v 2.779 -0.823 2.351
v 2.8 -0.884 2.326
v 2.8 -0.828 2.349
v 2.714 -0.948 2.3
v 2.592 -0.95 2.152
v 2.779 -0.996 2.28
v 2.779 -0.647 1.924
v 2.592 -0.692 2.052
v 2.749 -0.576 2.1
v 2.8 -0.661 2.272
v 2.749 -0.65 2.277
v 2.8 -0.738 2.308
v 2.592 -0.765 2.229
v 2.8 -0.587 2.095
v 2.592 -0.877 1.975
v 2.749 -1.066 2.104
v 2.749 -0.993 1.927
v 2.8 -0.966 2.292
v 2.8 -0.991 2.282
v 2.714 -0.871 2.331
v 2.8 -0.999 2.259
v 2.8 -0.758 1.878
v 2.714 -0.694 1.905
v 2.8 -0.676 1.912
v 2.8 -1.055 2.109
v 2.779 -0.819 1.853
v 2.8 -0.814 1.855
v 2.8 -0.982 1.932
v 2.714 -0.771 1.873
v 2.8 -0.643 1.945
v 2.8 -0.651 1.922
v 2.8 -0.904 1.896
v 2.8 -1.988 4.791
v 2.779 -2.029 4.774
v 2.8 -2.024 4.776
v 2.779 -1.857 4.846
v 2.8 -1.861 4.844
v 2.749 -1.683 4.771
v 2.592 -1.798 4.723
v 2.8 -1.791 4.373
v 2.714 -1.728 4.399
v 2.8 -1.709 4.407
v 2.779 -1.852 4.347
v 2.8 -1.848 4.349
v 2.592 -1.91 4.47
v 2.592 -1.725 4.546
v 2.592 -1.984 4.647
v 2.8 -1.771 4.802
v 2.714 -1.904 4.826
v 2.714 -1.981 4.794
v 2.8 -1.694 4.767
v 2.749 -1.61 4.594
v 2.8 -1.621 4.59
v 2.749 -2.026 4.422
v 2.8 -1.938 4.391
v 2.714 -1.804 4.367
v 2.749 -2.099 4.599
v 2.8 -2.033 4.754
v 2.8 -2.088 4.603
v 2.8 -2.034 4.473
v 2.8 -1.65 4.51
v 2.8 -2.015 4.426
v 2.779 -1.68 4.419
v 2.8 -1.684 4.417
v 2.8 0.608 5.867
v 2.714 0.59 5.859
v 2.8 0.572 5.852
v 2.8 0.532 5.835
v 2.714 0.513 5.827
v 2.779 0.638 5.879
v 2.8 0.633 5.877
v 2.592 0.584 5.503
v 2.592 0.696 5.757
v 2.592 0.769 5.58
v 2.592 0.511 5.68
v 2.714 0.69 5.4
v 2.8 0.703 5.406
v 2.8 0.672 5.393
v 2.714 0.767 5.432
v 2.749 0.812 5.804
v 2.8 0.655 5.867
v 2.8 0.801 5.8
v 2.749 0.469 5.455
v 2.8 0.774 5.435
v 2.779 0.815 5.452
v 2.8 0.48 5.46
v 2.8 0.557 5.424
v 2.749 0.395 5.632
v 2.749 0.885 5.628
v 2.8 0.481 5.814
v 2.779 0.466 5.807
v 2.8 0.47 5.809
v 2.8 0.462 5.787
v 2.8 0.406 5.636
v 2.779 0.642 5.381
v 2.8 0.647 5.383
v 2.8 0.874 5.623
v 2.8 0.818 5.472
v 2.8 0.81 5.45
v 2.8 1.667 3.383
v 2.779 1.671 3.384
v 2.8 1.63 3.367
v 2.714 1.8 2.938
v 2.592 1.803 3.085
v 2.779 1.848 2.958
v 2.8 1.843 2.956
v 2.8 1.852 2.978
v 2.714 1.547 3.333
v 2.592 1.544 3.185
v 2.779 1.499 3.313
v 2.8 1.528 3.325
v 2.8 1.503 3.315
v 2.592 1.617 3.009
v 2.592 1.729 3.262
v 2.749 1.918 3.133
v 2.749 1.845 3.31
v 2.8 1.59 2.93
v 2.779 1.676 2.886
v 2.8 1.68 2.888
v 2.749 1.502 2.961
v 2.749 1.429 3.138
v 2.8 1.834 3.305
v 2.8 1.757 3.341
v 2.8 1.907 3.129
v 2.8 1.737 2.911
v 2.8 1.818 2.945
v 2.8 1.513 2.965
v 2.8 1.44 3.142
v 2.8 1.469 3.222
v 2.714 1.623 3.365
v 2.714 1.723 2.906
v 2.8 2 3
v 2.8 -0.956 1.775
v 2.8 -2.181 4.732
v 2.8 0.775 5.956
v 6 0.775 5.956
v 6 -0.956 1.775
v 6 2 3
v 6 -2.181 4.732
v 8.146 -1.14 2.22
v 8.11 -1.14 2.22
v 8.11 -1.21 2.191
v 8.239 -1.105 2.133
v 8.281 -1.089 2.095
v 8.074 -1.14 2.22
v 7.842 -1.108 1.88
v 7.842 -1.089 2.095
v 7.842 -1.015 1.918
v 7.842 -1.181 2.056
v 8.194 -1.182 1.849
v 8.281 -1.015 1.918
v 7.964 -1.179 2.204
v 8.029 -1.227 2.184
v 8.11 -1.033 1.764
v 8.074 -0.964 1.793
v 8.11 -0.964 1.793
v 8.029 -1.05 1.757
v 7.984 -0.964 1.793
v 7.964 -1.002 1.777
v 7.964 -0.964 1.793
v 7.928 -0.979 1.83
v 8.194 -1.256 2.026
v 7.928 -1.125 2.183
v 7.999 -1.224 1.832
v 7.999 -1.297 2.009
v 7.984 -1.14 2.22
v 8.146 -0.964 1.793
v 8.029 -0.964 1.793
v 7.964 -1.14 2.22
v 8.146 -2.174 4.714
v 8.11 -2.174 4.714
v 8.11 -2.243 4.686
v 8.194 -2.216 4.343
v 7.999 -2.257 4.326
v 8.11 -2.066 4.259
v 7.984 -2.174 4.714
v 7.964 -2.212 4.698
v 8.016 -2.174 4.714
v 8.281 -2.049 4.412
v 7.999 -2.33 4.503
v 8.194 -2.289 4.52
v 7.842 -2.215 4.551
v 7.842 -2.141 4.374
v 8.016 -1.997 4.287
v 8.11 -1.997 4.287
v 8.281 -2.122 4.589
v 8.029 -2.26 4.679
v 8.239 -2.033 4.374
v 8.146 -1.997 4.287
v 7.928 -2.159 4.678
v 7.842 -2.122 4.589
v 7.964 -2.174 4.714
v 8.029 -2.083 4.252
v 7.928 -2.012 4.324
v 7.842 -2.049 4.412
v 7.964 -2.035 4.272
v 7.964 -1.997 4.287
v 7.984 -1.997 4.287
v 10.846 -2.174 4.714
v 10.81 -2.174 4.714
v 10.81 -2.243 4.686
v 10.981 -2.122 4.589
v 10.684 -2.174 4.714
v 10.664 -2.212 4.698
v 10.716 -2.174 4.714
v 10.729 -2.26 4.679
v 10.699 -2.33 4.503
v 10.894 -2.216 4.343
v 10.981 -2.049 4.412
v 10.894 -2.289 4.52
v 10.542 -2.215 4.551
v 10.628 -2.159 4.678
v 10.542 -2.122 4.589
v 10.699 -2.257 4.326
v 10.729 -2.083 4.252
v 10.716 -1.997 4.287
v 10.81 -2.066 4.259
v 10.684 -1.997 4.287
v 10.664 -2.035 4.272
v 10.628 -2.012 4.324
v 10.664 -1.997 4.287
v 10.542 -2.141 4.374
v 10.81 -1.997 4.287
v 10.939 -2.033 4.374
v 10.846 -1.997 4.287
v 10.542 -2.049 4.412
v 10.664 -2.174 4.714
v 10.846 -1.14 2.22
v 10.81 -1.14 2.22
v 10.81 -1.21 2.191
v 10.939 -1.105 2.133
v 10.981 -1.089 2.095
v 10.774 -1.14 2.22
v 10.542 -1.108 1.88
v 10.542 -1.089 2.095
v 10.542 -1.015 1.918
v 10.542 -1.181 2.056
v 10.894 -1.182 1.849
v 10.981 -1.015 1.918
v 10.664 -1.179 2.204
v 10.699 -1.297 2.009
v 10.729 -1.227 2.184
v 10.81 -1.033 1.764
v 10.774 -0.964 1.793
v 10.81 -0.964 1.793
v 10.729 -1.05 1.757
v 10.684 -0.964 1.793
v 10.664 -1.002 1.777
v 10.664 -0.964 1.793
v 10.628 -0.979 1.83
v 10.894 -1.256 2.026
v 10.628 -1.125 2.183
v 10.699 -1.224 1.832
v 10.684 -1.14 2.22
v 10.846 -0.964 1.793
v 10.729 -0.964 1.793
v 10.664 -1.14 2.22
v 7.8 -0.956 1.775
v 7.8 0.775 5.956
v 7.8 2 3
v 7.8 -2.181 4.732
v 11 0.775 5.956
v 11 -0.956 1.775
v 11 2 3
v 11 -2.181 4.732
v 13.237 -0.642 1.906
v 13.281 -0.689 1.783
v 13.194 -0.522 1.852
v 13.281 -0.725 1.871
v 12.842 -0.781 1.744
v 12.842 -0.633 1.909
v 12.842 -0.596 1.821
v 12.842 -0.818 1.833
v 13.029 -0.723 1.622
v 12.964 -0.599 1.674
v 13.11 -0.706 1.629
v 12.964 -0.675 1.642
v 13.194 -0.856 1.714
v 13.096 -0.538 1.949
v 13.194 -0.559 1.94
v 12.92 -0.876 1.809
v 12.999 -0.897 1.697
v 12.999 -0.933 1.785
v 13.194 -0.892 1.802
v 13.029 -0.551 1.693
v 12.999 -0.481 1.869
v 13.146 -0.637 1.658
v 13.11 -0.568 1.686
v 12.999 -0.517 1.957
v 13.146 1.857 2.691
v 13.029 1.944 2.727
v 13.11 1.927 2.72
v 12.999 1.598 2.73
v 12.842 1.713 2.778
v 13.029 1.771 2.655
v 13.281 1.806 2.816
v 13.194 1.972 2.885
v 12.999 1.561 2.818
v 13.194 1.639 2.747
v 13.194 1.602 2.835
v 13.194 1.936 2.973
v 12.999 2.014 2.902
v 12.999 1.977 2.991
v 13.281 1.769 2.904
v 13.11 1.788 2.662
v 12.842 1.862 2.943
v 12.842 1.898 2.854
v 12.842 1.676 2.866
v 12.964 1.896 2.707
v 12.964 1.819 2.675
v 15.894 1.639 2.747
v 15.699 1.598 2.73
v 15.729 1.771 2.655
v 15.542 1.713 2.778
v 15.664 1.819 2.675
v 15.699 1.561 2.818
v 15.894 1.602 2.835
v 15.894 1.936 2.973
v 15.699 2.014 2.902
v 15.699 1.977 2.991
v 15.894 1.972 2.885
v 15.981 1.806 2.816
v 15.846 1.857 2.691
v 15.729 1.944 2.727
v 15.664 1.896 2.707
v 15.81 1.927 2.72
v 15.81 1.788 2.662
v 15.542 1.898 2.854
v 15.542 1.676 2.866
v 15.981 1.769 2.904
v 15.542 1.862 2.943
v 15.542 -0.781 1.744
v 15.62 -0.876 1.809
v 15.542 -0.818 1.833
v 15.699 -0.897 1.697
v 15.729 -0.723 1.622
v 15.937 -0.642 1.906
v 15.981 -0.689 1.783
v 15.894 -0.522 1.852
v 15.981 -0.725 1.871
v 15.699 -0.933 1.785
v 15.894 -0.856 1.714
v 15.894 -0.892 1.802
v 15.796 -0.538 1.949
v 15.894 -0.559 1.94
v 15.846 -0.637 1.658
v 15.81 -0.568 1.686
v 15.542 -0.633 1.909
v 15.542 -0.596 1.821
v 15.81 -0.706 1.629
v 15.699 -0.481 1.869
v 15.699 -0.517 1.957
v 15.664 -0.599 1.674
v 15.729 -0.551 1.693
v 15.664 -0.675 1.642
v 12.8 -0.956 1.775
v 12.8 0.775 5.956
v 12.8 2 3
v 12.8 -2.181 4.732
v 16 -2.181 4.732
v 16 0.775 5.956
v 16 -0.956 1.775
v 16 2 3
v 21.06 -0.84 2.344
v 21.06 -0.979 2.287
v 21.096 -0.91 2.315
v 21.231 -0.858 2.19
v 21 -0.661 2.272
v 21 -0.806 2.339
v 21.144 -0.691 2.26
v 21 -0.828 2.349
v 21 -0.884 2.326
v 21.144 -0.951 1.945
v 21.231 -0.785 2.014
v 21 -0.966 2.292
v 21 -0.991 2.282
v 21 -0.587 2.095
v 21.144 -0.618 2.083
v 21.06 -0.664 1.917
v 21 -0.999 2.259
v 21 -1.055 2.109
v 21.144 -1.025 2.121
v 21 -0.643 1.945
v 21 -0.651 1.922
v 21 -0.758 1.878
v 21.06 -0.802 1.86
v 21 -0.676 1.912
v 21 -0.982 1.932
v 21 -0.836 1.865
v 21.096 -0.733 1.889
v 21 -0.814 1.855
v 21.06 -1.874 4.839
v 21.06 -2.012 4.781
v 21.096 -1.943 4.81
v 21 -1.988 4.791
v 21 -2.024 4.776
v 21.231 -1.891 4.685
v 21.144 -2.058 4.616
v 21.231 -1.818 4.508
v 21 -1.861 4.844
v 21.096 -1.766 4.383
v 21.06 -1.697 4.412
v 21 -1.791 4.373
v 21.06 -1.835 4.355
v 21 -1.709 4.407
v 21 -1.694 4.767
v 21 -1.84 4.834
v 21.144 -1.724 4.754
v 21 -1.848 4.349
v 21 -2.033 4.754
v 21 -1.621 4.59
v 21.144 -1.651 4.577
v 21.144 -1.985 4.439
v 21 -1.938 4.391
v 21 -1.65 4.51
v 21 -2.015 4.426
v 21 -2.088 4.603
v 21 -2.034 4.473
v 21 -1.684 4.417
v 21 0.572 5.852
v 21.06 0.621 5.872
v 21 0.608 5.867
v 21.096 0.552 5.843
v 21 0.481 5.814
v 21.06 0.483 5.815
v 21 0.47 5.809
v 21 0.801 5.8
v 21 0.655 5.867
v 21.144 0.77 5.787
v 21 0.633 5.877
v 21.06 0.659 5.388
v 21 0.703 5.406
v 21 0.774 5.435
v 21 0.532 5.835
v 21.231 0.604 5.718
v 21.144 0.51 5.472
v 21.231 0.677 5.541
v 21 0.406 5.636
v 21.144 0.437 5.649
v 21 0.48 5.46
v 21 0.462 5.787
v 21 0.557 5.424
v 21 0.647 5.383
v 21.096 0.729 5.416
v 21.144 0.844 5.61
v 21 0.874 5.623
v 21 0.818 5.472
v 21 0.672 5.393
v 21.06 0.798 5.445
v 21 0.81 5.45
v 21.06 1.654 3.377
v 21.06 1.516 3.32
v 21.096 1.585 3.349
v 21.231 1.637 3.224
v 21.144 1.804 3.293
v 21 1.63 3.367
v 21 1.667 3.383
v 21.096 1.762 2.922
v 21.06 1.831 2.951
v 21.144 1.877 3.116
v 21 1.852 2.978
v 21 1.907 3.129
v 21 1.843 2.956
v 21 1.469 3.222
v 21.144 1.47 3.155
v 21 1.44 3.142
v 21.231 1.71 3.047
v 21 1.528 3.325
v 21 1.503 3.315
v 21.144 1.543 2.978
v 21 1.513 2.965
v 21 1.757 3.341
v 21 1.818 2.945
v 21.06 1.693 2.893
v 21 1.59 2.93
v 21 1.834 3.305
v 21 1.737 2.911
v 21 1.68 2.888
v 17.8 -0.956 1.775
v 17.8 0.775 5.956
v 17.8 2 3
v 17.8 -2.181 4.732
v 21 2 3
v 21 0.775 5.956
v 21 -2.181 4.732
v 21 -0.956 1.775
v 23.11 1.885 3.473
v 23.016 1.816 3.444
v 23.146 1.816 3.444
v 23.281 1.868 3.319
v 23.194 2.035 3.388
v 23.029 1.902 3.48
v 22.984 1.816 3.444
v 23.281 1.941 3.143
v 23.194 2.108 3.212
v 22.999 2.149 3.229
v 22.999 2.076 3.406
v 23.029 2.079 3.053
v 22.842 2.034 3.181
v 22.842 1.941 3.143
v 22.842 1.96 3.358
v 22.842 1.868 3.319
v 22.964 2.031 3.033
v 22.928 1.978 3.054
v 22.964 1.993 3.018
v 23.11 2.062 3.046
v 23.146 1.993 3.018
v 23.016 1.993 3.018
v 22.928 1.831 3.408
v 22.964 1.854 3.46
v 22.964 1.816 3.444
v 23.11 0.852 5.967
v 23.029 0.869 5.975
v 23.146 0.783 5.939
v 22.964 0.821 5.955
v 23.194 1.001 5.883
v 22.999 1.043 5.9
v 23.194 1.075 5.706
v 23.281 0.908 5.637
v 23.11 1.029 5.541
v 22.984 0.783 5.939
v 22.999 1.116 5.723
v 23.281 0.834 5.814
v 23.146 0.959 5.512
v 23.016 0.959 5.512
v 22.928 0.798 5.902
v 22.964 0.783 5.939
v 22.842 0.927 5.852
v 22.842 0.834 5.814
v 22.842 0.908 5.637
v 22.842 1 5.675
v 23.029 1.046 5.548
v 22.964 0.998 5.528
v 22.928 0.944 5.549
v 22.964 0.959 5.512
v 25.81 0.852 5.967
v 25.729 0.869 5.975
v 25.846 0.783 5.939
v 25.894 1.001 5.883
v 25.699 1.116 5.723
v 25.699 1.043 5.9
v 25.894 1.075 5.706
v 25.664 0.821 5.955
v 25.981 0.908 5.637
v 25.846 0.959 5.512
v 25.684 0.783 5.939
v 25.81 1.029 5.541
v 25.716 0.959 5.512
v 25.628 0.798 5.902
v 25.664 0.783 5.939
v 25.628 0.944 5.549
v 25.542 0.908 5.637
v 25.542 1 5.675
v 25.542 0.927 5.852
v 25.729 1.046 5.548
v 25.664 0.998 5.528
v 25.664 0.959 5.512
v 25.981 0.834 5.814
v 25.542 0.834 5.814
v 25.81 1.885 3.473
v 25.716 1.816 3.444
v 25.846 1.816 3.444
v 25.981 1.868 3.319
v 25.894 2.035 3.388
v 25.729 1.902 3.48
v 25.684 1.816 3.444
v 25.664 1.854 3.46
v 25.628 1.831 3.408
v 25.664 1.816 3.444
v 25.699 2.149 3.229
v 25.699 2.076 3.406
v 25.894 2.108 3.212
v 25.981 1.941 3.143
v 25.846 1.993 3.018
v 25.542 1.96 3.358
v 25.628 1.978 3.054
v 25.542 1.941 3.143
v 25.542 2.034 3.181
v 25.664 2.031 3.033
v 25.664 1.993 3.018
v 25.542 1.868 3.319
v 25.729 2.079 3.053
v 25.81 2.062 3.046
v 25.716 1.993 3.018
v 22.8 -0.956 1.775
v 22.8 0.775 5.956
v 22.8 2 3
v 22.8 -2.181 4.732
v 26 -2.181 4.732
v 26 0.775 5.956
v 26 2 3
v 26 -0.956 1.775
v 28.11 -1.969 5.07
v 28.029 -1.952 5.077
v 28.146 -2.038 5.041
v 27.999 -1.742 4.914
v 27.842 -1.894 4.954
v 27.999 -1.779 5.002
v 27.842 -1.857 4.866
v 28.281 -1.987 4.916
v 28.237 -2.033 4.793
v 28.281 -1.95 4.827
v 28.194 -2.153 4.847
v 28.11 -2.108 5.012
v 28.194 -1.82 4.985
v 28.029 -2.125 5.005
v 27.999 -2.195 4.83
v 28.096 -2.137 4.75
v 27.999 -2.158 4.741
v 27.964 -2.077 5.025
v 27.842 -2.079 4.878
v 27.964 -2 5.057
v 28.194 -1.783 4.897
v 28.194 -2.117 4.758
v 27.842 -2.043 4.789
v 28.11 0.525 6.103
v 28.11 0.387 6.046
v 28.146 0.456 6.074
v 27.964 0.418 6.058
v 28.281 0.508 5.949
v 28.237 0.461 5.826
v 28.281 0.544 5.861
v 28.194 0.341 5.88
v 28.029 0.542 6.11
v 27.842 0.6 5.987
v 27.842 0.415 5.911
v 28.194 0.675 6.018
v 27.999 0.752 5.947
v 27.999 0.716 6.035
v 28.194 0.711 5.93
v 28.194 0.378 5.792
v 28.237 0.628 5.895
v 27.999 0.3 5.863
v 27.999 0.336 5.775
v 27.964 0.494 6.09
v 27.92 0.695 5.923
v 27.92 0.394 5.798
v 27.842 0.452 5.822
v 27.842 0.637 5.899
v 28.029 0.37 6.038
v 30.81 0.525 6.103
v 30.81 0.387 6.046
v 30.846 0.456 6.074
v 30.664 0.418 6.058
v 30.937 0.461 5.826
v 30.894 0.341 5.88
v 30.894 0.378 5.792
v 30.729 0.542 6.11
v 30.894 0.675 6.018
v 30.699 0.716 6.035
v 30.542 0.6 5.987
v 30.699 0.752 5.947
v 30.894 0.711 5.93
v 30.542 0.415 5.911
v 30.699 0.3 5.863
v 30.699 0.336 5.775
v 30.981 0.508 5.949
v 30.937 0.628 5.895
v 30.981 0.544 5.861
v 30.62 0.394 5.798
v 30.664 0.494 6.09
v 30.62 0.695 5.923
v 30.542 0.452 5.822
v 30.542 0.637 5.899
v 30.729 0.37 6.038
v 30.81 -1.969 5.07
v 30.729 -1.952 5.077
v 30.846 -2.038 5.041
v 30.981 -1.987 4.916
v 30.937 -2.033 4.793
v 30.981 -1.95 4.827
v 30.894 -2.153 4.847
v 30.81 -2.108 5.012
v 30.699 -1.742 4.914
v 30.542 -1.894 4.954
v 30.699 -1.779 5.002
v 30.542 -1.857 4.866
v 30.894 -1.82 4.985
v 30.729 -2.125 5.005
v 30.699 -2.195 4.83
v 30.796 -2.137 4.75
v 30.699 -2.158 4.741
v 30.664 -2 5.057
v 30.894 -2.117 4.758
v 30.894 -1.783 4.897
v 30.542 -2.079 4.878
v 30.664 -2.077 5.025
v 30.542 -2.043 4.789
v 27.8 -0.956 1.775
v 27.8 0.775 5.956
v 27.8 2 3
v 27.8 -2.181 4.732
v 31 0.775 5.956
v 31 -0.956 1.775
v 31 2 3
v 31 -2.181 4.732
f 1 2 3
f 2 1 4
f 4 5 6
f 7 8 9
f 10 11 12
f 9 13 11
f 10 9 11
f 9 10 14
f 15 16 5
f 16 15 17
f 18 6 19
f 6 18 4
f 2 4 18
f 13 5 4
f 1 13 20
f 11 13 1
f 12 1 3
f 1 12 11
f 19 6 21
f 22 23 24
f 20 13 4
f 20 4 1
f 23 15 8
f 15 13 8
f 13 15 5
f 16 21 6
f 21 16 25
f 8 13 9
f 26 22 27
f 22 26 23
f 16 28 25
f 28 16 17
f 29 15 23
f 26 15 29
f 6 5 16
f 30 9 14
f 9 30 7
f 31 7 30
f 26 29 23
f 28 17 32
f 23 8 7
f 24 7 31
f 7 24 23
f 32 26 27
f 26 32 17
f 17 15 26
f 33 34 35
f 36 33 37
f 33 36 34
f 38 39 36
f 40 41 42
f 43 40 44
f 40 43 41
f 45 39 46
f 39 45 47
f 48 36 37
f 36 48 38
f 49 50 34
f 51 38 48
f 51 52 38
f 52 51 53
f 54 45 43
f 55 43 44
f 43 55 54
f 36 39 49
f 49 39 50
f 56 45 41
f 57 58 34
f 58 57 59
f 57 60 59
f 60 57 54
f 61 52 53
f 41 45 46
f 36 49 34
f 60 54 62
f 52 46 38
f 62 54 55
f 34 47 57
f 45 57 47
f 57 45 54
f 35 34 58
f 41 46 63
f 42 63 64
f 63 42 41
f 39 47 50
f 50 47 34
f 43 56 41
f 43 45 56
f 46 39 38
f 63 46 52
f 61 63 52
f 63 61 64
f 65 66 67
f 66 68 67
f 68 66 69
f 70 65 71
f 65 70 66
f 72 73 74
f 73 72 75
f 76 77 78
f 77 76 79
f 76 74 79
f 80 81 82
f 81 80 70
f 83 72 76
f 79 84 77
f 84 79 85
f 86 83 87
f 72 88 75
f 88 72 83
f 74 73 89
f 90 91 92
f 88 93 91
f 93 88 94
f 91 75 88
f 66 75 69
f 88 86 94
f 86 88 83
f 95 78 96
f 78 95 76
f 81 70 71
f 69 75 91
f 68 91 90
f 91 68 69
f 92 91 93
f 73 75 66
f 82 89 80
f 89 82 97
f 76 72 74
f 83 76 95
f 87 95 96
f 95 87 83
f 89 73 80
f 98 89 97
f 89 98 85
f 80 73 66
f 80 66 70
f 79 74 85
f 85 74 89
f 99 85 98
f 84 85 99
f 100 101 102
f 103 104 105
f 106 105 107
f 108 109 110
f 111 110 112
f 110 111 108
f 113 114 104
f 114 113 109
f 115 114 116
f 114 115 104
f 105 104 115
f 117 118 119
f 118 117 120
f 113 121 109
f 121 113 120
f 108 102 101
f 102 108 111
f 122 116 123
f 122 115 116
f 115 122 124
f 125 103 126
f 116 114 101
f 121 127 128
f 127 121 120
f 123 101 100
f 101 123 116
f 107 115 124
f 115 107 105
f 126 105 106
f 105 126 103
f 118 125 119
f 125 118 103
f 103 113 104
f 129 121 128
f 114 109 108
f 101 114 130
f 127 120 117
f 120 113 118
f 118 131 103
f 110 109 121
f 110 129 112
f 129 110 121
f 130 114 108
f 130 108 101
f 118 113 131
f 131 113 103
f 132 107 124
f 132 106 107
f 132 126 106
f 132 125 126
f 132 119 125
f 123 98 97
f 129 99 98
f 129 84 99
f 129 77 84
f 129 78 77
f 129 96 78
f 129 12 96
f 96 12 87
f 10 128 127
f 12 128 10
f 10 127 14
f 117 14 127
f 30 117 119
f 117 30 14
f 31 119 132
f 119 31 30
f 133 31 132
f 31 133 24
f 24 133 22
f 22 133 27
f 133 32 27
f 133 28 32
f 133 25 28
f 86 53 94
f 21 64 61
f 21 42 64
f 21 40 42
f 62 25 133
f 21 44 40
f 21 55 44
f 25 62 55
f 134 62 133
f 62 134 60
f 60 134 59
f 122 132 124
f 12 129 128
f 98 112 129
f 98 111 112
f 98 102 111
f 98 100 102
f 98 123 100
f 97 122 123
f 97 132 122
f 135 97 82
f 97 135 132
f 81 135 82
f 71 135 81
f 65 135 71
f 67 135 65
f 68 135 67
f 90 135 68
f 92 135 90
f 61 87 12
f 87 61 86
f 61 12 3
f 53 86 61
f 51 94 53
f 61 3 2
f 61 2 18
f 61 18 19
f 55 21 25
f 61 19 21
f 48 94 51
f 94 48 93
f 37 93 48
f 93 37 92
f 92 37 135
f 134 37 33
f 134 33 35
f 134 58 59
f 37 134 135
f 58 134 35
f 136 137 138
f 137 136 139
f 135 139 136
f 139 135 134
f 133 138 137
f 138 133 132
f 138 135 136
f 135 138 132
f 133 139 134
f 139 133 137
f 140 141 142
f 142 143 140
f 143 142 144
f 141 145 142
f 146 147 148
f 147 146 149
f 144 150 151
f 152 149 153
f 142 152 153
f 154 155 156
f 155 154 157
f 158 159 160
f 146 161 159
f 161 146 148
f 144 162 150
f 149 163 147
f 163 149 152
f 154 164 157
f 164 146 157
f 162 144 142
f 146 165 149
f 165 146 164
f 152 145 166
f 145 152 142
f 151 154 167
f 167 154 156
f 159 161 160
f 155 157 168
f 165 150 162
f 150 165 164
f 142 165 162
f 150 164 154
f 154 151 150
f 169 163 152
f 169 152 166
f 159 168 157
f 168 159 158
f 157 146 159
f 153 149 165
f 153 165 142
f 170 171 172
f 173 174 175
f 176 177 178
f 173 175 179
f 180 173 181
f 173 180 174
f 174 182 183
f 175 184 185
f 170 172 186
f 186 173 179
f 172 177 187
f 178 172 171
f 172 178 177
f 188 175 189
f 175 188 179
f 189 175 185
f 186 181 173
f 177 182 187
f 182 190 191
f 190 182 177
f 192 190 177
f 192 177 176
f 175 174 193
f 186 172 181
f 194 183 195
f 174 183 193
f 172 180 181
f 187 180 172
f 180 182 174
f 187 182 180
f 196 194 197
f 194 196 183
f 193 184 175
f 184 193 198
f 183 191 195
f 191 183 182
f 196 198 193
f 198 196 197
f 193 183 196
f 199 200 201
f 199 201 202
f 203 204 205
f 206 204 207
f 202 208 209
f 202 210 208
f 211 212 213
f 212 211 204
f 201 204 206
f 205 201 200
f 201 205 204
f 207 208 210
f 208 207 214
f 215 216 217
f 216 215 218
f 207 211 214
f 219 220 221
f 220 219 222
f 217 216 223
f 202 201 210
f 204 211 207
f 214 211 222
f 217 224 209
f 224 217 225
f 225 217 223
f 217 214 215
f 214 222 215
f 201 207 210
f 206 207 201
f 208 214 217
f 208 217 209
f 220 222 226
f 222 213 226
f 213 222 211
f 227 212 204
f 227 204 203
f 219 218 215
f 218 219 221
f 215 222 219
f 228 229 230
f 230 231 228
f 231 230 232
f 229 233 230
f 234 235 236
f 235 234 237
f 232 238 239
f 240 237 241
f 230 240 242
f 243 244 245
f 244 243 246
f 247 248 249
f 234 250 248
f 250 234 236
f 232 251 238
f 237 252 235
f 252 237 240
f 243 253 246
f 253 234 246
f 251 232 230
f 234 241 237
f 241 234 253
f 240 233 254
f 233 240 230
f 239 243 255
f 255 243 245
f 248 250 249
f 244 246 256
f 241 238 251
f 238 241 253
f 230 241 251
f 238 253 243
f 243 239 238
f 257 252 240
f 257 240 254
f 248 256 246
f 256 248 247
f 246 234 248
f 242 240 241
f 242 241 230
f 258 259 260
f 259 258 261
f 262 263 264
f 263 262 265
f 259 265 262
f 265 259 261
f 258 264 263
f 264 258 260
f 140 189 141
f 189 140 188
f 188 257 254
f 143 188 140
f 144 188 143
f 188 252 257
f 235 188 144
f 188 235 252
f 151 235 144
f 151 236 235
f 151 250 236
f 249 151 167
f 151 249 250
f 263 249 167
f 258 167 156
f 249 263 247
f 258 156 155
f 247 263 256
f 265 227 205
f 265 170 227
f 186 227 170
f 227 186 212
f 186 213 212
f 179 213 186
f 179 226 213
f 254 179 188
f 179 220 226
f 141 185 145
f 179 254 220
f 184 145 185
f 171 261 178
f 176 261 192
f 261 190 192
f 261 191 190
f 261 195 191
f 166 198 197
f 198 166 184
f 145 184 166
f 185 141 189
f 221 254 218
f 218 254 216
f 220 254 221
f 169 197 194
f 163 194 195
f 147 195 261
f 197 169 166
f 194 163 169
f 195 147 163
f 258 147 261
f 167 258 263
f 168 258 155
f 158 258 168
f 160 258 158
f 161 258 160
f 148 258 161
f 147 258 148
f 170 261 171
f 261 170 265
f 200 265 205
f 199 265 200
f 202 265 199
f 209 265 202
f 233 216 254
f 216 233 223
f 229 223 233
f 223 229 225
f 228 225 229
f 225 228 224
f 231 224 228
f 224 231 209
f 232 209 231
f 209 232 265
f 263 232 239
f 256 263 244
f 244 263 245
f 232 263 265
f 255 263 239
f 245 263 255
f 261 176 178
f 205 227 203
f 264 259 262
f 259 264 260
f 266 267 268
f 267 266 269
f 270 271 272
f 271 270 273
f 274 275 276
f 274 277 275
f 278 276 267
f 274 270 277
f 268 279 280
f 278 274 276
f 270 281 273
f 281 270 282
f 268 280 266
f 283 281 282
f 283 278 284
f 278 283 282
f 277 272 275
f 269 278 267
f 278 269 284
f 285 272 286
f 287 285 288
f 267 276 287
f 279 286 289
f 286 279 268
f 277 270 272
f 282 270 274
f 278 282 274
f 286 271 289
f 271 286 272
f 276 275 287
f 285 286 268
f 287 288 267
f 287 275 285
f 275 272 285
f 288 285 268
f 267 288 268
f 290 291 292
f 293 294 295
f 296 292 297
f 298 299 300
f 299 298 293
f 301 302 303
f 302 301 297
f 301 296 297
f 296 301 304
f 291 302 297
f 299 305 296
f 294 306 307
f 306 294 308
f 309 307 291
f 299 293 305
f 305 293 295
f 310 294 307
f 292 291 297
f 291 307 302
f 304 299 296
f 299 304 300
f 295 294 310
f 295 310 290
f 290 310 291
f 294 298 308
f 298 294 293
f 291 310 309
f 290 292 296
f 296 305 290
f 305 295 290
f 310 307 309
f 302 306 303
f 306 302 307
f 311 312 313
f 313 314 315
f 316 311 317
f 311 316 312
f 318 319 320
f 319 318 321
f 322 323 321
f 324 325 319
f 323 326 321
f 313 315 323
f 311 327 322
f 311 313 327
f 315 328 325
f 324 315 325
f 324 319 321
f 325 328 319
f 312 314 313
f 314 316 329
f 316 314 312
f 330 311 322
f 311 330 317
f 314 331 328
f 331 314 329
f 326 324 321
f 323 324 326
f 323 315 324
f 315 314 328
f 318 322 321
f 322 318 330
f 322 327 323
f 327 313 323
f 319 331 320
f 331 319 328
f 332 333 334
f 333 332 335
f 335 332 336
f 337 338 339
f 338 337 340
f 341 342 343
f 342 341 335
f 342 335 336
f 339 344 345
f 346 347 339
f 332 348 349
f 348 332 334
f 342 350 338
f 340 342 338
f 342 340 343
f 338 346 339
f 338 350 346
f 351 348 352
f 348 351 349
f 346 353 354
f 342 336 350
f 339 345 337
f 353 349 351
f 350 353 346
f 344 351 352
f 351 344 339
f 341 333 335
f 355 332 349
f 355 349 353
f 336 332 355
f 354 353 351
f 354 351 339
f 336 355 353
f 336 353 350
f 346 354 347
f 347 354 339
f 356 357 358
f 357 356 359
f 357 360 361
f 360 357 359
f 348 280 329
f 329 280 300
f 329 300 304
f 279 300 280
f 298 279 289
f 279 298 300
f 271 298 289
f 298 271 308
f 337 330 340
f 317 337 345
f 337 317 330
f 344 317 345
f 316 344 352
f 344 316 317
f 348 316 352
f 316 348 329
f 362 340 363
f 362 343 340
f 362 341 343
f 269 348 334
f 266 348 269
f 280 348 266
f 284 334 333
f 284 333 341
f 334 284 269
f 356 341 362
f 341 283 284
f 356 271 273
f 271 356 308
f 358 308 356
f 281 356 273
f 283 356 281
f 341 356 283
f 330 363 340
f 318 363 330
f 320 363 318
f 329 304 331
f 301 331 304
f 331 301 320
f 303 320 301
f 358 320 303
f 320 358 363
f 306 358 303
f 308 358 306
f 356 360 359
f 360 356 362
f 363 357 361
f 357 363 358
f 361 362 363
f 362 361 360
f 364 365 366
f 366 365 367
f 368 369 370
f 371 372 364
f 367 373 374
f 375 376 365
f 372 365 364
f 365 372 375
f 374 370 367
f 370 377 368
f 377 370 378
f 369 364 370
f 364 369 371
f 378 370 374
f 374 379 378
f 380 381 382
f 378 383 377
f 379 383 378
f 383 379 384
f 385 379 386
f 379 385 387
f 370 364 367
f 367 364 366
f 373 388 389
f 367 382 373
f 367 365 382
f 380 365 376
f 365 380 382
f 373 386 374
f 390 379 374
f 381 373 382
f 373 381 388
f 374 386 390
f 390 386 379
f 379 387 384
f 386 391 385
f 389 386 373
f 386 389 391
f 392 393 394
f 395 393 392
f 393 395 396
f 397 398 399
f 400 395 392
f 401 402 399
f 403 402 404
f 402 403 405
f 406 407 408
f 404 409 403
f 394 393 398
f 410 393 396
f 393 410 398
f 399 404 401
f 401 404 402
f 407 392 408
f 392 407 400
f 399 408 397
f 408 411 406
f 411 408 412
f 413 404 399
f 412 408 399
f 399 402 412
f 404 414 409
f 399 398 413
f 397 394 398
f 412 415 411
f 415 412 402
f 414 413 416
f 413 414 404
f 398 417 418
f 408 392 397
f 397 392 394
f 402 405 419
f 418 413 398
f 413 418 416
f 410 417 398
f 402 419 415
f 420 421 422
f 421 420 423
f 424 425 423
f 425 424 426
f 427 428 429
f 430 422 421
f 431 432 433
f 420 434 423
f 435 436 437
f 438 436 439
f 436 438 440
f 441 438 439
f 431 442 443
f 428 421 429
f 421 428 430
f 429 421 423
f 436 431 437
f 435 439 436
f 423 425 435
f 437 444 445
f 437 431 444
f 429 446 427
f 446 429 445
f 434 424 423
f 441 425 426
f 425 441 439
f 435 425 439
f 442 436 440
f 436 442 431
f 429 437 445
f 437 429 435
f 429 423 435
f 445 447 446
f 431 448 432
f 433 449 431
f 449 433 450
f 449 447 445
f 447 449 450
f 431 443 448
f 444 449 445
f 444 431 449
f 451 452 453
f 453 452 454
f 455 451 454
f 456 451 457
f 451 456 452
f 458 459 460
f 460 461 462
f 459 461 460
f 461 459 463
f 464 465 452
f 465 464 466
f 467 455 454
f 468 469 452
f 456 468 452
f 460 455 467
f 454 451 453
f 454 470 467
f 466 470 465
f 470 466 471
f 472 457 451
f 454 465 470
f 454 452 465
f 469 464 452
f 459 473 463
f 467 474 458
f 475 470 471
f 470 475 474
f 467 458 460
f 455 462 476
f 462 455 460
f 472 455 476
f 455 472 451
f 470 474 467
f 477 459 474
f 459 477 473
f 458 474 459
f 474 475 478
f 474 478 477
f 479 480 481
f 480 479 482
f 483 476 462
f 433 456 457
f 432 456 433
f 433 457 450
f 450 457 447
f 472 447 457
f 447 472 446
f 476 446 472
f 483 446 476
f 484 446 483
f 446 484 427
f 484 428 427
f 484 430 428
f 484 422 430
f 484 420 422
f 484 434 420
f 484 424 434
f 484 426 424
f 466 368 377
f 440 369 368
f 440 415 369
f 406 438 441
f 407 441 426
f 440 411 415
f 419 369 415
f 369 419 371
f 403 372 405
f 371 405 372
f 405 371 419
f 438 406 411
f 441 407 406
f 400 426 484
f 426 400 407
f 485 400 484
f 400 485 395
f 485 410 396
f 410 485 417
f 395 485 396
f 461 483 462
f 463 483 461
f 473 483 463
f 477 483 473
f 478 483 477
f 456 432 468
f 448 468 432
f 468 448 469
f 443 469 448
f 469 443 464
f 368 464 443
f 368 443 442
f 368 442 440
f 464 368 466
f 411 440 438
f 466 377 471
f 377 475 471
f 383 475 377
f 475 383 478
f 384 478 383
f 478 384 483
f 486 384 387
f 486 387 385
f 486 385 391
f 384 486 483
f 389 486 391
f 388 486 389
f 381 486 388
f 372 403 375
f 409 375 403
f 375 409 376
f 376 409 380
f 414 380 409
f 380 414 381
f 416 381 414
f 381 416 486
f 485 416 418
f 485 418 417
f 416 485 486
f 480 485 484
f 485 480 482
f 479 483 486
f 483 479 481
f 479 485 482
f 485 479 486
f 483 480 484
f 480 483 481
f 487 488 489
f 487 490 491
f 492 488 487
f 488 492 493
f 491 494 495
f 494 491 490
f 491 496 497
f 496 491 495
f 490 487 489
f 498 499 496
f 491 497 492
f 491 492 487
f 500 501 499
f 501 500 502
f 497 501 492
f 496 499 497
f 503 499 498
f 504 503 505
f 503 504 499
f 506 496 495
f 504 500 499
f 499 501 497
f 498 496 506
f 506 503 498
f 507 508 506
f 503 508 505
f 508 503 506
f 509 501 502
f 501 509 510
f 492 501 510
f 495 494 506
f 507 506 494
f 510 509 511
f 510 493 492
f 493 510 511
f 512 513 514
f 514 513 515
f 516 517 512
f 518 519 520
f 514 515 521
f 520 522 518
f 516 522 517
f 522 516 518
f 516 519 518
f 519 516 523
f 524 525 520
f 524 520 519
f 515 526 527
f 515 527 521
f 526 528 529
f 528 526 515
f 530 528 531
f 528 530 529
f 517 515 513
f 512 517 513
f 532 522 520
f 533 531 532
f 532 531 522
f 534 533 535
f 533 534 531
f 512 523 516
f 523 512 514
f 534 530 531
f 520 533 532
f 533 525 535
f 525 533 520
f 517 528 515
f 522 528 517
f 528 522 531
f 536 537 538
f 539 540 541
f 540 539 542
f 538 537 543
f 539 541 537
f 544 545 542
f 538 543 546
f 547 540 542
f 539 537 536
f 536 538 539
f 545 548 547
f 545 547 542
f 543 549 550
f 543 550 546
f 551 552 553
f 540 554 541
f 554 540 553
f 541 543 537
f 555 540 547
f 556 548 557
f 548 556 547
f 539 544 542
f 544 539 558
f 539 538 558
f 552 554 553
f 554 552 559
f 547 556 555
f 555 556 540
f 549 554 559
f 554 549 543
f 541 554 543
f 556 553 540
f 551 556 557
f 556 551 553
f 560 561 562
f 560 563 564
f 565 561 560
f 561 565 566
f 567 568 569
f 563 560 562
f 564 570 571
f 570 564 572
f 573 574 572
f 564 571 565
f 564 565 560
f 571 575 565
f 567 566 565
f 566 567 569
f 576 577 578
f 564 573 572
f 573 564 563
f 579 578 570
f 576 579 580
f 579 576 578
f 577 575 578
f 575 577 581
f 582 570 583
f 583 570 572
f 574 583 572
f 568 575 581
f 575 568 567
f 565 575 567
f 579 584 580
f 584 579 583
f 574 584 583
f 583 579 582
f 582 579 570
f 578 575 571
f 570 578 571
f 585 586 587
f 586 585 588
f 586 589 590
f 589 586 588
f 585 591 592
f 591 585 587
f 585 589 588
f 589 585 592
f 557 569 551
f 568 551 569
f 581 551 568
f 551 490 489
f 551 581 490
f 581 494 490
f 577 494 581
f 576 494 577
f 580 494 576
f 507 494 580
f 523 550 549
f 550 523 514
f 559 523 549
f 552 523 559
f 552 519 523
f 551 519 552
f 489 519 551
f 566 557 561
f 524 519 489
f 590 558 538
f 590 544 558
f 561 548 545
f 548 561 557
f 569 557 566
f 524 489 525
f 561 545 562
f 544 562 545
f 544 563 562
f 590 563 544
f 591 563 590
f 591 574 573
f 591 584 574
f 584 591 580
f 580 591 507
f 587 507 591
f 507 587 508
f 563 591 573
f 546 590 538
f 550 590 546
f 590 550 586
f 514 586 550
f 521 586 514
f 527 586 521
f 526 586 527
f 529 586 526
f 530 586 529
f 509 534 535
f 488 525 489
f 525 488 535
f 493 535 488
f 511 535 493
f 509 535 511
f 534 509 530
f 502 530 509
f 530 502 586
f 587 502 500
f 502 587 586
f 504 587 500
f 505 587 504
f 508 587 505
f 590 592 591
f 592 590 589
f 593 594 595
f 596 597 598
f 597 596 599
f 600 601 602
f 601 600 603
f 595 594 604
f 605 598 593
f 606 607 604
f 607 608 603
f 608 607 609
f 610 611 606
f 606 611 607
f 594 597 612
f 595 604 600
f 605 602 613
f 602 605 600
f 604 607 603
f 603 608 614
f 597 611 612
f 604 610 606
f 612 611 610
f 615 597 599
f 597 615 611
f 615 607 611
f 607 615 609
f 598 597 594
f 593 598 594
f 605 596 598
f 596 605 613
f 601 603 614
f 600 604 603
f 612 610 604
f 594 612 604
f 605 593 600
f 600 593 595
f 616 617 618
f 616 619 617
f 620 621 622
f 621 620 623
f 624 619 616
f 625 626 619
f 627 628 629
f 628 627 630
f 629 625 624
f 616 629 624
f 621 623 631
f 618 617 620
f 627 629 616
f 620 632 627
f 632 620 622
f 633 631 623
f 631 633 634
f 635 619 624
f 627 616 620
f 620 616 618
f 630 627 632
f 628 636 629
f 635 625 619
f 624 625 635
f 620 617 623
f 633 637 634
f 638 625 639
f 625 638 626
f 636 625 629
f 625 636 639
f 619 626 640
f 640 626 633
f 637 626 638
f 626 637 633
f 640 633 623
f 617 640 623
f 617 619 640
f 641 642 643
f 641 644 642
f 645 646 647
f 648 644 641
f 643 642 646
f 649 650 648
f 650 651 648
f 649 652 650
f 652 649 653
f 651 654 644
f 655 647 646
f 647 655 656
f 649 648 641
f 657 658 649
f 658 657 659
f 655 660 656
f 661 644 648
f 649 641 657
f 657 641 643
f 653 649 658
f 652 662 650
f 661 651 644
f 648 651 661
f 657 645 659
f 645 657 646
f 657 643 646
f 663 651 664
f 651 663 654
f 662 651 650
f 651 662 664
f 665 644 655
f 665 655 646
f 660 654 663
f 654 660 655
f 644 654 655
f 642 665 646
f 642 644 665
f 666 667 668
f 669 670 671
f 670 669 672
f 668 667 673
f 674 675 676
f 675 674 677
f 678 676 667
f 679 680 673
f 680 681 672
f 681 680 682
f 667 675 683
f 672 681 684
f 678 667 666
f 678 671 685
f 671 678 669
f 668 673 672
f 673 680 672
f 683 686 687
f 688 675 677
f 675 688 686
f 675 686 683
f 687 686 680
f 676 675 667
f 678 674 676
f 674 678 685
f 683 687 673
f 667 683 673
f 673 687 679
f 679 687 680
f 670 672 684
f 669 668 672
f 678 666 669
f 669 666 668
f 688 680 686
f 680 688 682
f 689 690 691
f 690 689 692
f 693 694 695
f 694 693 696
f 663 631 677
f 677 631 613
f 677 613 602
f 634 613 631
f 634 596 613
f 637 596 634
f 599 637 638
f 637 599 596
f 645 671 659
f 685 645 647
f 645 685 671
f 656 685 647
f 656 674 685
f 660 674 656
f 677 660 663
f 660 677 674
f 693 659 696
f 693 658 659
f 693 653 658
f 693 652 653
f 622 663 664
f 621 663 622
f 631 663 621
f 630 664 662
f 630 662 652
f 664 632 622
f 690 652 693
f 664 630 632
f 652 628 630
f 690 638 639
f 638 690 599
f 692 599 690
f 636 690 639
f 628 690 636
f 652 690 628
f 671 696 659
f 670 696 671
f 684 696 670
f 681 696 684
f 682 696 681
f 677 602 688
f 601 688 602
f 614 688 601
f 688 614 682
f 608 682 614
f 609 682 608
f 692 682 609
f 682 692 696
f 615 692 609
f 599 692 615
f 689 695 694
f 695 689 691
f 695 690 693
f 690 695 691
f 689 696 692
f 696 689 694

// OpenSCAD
$fn=7;
union()
{
	union()
	{
		translate([2.8,-0.95641446,1.7754129])
		{
			rotate(22.500002,[1,0,0])
			{
				cube([3.2,3.2,3.2]);
			}
		}
		union()
		{
			translate([2.8,-0.82111543,2.1020536])
			{
				rotate(22.500002,[1,0,0])
				{
					sphere(d=0.5);
				}
			}
			translate([2.8,-1.8543608,4.596528])
			{
				rotate(22.500002,[1,0,0])
				{
					sphere(d=0.5);
				}
			}
			translate([2.8,0.6401139,5.6297736])
			{
				rotate(22.500002,[1,0,0])
				{
					sphere(d=0.5);
				}
			}
			translate([2.8,1.6733592,3.1352987])
			{
				rotate(22.500002,[1,0,0])
				{
					sphere(d=0.5);
				}
			}
		}
	}
	union()
	{
		translate([7.8,-0.95641446,1.7754129])
		{
			rotate(22.500002,[1,0,0])
			{
				cube([3.2,3.2,3.2]);
			}
		}
		union()
		{
			translate([8.05,-1.0520854,2.006383])
			{
				rotate(22.500002,[1,0,0])
				{
					sphere(d=0.5);
				}
			}
			translate([8.05,-2.0853307,4.5008574])
			{
				rotate(22.500002,[1,0,0])
				{
					sphere(d=0.5);
				}
			}
			translate([10.75,-2.0853307,4.5008574])
			{
				rotate(22.500002,[1,0,0])
				{
					sphere(d=0.5);
				}
			}
			translate([10.75,-1.0520854,2.006383])
			{
				rotate(22.500002,[1,0,0])
				{
					sphere(d=0.5);
				}
			}
		}
	}
	union()
	{
		translate([12.8,-0.95641446,1.7754129])
		{
			rotate(22.500002,[1,0,0])
			{
				cube([3.2,3.2,3.2]);
			}
		}
		union()
		{
			translate([13.05,-0.72544456,1.8710837])
			{
				rotate(22.500002,[1,0,0])
				{
					sphere(d=0.5);
				}
			}
			translate([13.05,1.76903,2.9043288])
			{
				rotate(22.500002,[1,0,0])
				{
					sphere(d=0.5);
				}
			}
			translate([15.75,1.76903,2.9043288])
			{
				rotate(22.500002,[1,0,0])
				{
					sphere(d=0.5);
				}
			}
			translate([15.75,-0.72544456,1.8710837])
			{
				rotate(22.500002,[1,0,0])
				{
					sphere(d=0.5);
				}
			}
		}
	}
	union()
	{
		translate([17.8,-0.95641446,1.7754129])
		{
			rotate(22.500002,[1,0,0])
			{
				cube([3.2,3.2,3.2]);
			}
		}
		union()
		{
			translate([21,-0.82111543,2.1020536])
			{
				rotate(22.500002,[1,0,0])
				{
					sphere(d=0.5);
				}
			}
			translate([21,-1.8543608,4.596528])
			{
				rotate(22.500002,[1,0,0])
				{
					sphere(d=0.5);
				}
			}
			translate([21,0.6401139,5.6297736])
			{
				rotate(22.500002,[1,0,0])
				{
					sphere(d=0.5);
				}
			}
			translate([21,1.6733592,3.1352987])
			{
				rotate(22.500002,[1,0,0])
				{
					sphere(d=0.5);
				}
			}
		}
	}
	union()
	{
		translate([22.8,-0.95641446,1.7754129])
		{
			rotate(22.500002,[1,0,0])
			{
				cube([3.2,3.2,3.2]);
			}
		}
		union()
		{
			translate([23.05,1.9043291,3.23097])
			{
				rotate(22.500002,[1,0,0])
				{
					sphere(d=0.5);
				}
			}
			translate([23.05,0.8710838,5.7254443])
			{
				rotate(22.500002,[1,0,0])
				{
					sphere(d=0.5);
				}
			}
			translate([25.75,0.8710838,5.7254443])
			{
				rotate(22.500002,[1,0,0])
				{
					sphere(d=0.5);
				}
			}
			translate([25.75,1.9043291,3.23097])
			{
				rotate(22.500002,[1,0,0])
				{
					sphere(d=0.5);
				}
			}
		}
	}
	union()
	{
		translate([27.8,-0.95641446,1.7754129])
		{
			rotate(22.500002,[1,0,0])
			{
				cube([3.2,3.2,3.2]);
			}
		}
		union()
		{
			translate([28.05,-1.9500318,4.827498])
			{
				rotate(22.500002,[1,0,0])
				{
					sphere(d=0.5);
				}
			}
			translate([28.05,0.544443,5.8607435])
			{
				rotate(22.500002,[1,0,0])
				{
					sphere(d=0.5);
				}
			}
			translate([30.75,0.544443,5.8607435])
			{
				rotate(22.500002,[1,0,0])
				{
					sphere(d=0.5);
				}
			}
			translate([30.75,-1.9500318,4.827498])
			{
				rotate(22.500002,[1,0,0])
				{
					sphere(d=0.5);
				}
			}
		}
	}
}
